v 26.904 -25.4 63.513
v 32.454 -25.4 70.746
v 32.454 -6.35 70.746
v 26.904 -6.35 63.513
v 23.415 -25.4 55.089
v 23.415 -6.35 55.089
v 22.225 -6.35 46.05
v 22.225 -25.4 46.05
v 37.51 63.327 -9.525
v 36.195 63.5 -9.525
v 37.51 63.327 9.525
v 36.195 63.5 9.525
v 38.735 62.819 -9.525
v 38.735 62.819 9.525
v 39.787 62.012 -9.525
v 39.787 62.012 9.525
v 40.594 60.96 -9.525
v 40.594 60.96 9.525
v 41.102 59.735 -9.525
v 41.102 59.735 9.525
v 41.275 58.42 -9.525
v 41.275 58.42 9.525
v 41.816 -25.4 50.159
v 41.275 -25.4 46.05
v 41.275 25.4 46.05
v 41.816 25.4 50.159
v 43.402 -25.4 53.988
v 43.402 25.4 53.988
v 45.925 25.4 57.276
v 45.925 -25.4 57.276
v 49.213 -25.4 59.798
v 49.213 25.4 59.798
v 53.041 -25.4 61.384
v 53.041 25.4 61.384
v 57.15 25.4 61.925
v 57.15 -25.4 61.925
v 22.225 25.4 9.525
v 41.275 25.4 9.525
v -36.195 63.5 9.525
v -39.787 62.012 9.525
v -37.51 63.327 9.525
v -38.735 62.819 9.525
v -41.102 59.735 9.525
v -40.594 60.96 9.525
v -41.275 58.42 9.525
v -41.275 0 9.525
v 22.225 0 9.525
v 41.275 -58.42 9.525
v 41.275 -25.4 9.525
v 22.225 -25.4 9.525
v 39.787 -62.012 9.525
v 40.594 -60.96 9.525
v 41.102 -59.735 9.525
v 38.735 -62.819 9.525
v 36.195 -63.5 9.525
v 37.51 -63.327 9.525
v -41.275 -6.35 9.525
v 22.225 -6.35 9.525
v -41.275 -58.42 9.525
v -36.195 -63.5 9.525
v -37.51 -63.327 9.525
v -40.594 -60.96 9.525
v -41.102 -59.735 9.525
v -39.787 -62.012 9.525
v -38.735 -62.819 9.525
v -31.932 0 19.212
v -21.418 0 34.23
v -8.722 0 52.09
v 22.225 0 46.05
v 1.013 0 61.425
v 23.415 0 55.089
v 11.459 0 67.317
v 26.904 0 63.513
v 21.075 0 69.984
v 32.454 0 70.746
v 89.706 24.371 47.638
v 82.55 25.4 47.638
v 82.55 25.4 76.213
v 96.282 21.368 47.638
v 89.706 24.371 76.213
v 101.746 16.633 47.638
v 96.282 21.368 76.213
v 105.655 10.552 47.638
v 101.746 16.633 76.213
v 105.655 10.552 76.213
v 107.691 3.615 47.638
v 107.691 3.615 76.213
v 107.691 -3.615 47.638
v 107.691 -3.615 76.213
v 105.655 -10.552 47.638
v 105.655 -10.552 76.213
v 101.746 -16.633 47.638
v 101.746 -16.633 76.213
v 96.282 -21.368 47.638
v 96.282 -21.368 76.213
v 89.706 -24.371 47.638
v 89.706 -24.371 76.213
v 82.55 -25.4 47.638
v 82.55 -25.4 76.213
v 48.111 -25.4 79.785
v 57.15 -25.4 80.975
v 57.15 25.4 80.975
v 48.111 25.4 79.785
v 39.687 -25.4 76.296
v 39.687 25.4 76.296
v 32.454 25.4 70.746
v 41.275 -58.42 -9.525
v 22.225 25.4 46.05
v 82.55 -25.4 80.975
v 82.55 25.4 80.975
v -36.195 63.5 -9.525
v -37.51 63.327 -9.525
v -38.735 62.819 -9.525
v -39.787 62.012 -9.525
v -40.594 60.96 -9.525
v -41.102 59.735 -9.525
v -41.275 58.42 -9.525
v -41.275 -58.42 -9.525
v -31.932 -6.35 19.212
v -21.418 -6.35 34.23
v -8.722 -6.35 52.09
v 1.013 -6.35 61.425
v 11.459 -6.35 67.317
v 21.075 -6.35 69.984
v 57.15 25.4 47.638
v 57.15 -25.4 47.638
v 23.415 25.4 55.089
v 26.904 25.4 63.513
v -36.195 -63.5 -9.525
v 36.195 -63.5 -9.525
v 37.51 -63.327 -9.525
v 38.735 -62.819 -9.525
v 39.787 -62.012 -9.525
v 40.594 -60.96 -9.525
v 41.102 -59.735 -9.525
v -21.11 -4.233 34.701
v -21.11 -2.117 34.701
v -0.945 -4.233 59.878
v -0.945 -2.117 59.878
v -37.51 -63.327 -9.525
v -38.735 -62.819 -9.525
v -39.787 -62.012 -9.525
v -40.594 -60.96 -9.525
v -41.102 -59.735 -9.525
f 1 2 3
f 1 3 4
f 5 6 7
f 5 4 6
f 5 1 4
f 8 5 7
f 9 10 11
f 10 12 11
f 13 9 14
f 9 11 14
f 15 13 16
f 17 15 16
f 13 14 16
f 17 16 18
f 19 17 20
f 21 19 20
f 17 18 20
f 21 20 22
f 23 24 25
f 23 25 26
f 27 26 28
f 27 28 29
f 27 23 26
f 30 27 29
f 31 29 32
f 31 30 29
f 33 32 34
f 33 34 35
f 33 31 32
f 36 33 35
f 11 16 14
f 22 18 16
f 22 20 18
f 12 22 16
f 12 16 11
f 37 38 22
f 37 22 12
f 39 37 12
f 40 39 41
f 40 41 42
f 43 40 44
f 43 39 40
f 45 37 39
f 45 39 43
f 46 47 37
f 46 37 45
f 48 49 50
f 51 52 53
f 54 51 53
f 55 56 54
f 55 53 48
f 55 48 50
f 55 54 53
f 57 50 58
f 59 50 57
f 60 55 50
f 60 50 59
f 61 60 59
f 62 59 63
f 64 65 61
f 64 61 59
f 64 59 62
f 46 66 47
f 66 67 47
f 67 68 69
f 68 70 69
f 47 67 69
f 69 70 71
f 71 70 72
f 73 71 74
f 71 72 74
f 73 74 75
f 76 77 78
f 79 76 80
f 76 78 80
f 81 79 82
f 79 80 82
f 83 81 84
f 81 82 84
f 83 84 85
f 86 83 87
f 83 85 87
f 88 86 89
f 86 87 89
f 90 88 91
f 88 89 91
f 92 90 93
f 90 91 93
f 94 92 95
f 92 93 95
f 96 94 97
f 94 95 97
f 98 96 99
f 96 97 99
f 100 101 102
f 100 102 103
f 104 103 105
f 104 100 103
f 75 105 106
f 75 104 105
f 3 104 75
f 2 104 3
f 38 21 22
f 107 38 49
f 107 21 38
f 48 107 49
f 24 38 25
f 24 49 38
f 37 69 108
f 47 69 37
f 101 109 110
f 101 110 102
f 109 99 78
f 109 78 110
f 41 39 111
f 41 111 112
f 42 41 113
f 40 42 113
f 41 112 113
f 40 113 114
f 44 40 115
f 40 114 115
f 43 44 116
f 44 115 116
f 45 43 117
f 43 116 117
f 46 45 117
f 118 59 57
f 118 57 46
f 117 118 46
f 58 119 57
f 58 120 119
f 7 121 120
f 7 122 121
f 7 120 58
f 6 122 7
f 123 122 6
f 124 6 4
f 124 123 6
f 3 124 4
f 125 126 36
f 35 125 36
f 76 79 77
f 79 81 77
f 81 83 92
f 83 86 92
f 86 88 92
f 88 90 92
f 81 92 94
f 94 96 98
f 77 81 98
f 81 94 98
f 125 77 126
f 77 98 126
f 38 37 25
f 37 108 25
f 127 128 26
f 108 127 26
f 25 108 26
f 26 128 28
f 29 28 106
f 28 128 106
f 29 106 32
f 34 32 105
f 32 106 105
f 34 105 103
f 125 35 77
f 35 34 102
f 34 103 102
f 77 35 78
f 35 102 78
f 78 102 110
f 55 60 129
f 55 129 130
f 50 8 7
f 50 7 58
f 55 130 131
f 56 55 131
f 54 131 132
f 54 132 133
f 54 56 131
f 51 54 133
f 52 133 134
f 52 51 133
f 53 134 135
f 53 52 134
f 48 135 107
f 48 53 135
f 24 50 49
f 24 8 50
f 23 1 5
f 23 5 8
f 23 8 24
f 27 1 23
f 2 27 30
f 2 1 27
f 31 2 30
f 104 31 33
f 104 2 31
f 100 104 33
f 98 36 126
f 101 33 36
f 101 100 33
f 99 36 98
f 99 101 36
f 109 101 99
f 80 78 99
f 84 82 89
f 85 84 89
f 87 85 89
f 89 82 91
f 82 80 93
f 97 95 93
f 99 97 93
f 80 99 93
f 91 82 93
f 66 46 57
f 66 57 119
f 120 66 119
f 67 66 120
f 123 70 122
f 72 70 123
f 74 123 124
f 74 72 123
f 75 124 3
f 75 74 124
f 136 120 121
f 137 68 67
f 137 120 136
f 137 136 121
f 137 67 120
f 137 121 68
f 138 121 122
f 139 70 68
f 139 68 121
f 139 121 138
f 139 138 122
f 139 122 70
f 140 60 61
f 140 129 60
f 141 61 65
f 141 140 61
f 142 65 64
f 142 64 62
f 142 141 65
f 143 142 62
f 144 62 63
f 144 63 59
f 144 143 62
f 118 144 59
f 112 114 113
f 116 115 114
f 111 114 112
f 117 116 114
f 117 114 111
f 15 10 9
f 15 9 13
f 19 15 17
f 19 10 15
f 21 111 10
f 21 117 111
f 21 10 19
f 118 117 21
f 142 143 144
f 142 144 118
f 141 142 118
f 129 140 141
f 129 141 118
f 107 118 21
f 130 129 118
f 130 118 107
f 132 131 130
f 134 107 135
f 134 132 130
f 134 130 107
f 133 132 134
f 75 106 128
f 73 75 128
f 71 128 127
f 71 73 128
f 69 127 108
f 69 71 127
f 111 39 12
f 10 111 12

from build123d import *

# Parameters (mm, degrees)
F1_DEPTH = 63.5
F0_W     = 25.4
F0_H     = 14.2875
F2_DEPTH = 25.4
F3_DEPTH = 6.35
F5_R     = 5.08


with BuildPart() as f1:
    # F0 (on Front) → F1 (new body, symmetric)
    with BuildSketch(Plane.XZ):
        Polygon((41.275, -9.525), (41.275, 9.525), (22.225, 9.525), (-41.275, 9.525), (-41.275, -9.525), align=None)
    extrude(amount=F1_DEPTH, both=True)

    # F0 (on Front) → F2 (join, symmetric)
    with BuildSketch(Plane.XZ):
        with BuildLine():
            Line((22.225, 9.525), (41.275, 9.525))
            Line((41.275, 9.525), (41.275, 46.0502))
            ThreePointArc((41.275, 46.0502), (45.92468, 57.27552), (57.15, 61.9252))
            Line((57.15, 61.9252), (57.15, 76.2127))
            Line((57.15, 76.2127), (82.55, 76.2127))
            Line((82.55, 76.2127), (82.55, 80.9752))
            Line((82.55, 80.9752), (57.15, 80.9752))
            ThreePointArc((57.15, 80.9752), (43.784781, 78.316693), (32.454296, 70.745904))
            ThreePointArc((32.454296, 70.745904), (24.883507, 59.415419), (22.225, 46.0502))
            Line((22.225, 46.0502), (22.225, 9.525))
        make_face()
        with Locations((69.85, 69.06895)):
            Rectangle(F0_W, F0_H)
        with Locations((69.85, 54.78145)):
            Rectangle(F0_W, F0_H)
    extrude(amount=F2_DEPTH, both=True)

    # F0 (on Front) → F3 (join)
    with BuildSketch(Plane.XZ):
        with BuildLine():
            Line((-41.275, 9.525), (22.225, 9.525))
            Line((22.225, 9.525), (22.225, 46.0502))
            ThreePointArc((22.225, 46.0502), (24.883507, 59.415419), (32.454296, 70.745904))
            add(Edge.make_bspline(
                [(-41.275, 9.525), (-16.698568, 29.931968), (-11.974066, 71.80158), (32.454296, 70.745904)],
                knots=[0, 0, 0, 0, 95.833231, 95.833231, 95.833231, 95.833231], degree=3))
        make_face()
    extrude(amount=F3_DEPTH)

    # F0 (on Front) → F4 (revolve)
    with BuildSketch(Plane.XZ):
        Polygon((82.55, 76.2127), (82.55, 61.9252), (82.55, 47.6377), (107.95, 47.6377), (107.95, 76.2127), align=None)
    revolve(axis=Axis((82.55, 0, 64.30645), (0, 0, -1)))

    # F5
    f5_edges = [f1.edges().sort_by_distance(p)[0] for p in [
        (-41.275, -63.5, 0),
        (41.275, -63.5, 0),
        (-41.275, 63.5, 0),
        (41.275, 63.5, 0),
    ]]
    fillet(f5_edges, radius=F5_R)


solid = f1.part
